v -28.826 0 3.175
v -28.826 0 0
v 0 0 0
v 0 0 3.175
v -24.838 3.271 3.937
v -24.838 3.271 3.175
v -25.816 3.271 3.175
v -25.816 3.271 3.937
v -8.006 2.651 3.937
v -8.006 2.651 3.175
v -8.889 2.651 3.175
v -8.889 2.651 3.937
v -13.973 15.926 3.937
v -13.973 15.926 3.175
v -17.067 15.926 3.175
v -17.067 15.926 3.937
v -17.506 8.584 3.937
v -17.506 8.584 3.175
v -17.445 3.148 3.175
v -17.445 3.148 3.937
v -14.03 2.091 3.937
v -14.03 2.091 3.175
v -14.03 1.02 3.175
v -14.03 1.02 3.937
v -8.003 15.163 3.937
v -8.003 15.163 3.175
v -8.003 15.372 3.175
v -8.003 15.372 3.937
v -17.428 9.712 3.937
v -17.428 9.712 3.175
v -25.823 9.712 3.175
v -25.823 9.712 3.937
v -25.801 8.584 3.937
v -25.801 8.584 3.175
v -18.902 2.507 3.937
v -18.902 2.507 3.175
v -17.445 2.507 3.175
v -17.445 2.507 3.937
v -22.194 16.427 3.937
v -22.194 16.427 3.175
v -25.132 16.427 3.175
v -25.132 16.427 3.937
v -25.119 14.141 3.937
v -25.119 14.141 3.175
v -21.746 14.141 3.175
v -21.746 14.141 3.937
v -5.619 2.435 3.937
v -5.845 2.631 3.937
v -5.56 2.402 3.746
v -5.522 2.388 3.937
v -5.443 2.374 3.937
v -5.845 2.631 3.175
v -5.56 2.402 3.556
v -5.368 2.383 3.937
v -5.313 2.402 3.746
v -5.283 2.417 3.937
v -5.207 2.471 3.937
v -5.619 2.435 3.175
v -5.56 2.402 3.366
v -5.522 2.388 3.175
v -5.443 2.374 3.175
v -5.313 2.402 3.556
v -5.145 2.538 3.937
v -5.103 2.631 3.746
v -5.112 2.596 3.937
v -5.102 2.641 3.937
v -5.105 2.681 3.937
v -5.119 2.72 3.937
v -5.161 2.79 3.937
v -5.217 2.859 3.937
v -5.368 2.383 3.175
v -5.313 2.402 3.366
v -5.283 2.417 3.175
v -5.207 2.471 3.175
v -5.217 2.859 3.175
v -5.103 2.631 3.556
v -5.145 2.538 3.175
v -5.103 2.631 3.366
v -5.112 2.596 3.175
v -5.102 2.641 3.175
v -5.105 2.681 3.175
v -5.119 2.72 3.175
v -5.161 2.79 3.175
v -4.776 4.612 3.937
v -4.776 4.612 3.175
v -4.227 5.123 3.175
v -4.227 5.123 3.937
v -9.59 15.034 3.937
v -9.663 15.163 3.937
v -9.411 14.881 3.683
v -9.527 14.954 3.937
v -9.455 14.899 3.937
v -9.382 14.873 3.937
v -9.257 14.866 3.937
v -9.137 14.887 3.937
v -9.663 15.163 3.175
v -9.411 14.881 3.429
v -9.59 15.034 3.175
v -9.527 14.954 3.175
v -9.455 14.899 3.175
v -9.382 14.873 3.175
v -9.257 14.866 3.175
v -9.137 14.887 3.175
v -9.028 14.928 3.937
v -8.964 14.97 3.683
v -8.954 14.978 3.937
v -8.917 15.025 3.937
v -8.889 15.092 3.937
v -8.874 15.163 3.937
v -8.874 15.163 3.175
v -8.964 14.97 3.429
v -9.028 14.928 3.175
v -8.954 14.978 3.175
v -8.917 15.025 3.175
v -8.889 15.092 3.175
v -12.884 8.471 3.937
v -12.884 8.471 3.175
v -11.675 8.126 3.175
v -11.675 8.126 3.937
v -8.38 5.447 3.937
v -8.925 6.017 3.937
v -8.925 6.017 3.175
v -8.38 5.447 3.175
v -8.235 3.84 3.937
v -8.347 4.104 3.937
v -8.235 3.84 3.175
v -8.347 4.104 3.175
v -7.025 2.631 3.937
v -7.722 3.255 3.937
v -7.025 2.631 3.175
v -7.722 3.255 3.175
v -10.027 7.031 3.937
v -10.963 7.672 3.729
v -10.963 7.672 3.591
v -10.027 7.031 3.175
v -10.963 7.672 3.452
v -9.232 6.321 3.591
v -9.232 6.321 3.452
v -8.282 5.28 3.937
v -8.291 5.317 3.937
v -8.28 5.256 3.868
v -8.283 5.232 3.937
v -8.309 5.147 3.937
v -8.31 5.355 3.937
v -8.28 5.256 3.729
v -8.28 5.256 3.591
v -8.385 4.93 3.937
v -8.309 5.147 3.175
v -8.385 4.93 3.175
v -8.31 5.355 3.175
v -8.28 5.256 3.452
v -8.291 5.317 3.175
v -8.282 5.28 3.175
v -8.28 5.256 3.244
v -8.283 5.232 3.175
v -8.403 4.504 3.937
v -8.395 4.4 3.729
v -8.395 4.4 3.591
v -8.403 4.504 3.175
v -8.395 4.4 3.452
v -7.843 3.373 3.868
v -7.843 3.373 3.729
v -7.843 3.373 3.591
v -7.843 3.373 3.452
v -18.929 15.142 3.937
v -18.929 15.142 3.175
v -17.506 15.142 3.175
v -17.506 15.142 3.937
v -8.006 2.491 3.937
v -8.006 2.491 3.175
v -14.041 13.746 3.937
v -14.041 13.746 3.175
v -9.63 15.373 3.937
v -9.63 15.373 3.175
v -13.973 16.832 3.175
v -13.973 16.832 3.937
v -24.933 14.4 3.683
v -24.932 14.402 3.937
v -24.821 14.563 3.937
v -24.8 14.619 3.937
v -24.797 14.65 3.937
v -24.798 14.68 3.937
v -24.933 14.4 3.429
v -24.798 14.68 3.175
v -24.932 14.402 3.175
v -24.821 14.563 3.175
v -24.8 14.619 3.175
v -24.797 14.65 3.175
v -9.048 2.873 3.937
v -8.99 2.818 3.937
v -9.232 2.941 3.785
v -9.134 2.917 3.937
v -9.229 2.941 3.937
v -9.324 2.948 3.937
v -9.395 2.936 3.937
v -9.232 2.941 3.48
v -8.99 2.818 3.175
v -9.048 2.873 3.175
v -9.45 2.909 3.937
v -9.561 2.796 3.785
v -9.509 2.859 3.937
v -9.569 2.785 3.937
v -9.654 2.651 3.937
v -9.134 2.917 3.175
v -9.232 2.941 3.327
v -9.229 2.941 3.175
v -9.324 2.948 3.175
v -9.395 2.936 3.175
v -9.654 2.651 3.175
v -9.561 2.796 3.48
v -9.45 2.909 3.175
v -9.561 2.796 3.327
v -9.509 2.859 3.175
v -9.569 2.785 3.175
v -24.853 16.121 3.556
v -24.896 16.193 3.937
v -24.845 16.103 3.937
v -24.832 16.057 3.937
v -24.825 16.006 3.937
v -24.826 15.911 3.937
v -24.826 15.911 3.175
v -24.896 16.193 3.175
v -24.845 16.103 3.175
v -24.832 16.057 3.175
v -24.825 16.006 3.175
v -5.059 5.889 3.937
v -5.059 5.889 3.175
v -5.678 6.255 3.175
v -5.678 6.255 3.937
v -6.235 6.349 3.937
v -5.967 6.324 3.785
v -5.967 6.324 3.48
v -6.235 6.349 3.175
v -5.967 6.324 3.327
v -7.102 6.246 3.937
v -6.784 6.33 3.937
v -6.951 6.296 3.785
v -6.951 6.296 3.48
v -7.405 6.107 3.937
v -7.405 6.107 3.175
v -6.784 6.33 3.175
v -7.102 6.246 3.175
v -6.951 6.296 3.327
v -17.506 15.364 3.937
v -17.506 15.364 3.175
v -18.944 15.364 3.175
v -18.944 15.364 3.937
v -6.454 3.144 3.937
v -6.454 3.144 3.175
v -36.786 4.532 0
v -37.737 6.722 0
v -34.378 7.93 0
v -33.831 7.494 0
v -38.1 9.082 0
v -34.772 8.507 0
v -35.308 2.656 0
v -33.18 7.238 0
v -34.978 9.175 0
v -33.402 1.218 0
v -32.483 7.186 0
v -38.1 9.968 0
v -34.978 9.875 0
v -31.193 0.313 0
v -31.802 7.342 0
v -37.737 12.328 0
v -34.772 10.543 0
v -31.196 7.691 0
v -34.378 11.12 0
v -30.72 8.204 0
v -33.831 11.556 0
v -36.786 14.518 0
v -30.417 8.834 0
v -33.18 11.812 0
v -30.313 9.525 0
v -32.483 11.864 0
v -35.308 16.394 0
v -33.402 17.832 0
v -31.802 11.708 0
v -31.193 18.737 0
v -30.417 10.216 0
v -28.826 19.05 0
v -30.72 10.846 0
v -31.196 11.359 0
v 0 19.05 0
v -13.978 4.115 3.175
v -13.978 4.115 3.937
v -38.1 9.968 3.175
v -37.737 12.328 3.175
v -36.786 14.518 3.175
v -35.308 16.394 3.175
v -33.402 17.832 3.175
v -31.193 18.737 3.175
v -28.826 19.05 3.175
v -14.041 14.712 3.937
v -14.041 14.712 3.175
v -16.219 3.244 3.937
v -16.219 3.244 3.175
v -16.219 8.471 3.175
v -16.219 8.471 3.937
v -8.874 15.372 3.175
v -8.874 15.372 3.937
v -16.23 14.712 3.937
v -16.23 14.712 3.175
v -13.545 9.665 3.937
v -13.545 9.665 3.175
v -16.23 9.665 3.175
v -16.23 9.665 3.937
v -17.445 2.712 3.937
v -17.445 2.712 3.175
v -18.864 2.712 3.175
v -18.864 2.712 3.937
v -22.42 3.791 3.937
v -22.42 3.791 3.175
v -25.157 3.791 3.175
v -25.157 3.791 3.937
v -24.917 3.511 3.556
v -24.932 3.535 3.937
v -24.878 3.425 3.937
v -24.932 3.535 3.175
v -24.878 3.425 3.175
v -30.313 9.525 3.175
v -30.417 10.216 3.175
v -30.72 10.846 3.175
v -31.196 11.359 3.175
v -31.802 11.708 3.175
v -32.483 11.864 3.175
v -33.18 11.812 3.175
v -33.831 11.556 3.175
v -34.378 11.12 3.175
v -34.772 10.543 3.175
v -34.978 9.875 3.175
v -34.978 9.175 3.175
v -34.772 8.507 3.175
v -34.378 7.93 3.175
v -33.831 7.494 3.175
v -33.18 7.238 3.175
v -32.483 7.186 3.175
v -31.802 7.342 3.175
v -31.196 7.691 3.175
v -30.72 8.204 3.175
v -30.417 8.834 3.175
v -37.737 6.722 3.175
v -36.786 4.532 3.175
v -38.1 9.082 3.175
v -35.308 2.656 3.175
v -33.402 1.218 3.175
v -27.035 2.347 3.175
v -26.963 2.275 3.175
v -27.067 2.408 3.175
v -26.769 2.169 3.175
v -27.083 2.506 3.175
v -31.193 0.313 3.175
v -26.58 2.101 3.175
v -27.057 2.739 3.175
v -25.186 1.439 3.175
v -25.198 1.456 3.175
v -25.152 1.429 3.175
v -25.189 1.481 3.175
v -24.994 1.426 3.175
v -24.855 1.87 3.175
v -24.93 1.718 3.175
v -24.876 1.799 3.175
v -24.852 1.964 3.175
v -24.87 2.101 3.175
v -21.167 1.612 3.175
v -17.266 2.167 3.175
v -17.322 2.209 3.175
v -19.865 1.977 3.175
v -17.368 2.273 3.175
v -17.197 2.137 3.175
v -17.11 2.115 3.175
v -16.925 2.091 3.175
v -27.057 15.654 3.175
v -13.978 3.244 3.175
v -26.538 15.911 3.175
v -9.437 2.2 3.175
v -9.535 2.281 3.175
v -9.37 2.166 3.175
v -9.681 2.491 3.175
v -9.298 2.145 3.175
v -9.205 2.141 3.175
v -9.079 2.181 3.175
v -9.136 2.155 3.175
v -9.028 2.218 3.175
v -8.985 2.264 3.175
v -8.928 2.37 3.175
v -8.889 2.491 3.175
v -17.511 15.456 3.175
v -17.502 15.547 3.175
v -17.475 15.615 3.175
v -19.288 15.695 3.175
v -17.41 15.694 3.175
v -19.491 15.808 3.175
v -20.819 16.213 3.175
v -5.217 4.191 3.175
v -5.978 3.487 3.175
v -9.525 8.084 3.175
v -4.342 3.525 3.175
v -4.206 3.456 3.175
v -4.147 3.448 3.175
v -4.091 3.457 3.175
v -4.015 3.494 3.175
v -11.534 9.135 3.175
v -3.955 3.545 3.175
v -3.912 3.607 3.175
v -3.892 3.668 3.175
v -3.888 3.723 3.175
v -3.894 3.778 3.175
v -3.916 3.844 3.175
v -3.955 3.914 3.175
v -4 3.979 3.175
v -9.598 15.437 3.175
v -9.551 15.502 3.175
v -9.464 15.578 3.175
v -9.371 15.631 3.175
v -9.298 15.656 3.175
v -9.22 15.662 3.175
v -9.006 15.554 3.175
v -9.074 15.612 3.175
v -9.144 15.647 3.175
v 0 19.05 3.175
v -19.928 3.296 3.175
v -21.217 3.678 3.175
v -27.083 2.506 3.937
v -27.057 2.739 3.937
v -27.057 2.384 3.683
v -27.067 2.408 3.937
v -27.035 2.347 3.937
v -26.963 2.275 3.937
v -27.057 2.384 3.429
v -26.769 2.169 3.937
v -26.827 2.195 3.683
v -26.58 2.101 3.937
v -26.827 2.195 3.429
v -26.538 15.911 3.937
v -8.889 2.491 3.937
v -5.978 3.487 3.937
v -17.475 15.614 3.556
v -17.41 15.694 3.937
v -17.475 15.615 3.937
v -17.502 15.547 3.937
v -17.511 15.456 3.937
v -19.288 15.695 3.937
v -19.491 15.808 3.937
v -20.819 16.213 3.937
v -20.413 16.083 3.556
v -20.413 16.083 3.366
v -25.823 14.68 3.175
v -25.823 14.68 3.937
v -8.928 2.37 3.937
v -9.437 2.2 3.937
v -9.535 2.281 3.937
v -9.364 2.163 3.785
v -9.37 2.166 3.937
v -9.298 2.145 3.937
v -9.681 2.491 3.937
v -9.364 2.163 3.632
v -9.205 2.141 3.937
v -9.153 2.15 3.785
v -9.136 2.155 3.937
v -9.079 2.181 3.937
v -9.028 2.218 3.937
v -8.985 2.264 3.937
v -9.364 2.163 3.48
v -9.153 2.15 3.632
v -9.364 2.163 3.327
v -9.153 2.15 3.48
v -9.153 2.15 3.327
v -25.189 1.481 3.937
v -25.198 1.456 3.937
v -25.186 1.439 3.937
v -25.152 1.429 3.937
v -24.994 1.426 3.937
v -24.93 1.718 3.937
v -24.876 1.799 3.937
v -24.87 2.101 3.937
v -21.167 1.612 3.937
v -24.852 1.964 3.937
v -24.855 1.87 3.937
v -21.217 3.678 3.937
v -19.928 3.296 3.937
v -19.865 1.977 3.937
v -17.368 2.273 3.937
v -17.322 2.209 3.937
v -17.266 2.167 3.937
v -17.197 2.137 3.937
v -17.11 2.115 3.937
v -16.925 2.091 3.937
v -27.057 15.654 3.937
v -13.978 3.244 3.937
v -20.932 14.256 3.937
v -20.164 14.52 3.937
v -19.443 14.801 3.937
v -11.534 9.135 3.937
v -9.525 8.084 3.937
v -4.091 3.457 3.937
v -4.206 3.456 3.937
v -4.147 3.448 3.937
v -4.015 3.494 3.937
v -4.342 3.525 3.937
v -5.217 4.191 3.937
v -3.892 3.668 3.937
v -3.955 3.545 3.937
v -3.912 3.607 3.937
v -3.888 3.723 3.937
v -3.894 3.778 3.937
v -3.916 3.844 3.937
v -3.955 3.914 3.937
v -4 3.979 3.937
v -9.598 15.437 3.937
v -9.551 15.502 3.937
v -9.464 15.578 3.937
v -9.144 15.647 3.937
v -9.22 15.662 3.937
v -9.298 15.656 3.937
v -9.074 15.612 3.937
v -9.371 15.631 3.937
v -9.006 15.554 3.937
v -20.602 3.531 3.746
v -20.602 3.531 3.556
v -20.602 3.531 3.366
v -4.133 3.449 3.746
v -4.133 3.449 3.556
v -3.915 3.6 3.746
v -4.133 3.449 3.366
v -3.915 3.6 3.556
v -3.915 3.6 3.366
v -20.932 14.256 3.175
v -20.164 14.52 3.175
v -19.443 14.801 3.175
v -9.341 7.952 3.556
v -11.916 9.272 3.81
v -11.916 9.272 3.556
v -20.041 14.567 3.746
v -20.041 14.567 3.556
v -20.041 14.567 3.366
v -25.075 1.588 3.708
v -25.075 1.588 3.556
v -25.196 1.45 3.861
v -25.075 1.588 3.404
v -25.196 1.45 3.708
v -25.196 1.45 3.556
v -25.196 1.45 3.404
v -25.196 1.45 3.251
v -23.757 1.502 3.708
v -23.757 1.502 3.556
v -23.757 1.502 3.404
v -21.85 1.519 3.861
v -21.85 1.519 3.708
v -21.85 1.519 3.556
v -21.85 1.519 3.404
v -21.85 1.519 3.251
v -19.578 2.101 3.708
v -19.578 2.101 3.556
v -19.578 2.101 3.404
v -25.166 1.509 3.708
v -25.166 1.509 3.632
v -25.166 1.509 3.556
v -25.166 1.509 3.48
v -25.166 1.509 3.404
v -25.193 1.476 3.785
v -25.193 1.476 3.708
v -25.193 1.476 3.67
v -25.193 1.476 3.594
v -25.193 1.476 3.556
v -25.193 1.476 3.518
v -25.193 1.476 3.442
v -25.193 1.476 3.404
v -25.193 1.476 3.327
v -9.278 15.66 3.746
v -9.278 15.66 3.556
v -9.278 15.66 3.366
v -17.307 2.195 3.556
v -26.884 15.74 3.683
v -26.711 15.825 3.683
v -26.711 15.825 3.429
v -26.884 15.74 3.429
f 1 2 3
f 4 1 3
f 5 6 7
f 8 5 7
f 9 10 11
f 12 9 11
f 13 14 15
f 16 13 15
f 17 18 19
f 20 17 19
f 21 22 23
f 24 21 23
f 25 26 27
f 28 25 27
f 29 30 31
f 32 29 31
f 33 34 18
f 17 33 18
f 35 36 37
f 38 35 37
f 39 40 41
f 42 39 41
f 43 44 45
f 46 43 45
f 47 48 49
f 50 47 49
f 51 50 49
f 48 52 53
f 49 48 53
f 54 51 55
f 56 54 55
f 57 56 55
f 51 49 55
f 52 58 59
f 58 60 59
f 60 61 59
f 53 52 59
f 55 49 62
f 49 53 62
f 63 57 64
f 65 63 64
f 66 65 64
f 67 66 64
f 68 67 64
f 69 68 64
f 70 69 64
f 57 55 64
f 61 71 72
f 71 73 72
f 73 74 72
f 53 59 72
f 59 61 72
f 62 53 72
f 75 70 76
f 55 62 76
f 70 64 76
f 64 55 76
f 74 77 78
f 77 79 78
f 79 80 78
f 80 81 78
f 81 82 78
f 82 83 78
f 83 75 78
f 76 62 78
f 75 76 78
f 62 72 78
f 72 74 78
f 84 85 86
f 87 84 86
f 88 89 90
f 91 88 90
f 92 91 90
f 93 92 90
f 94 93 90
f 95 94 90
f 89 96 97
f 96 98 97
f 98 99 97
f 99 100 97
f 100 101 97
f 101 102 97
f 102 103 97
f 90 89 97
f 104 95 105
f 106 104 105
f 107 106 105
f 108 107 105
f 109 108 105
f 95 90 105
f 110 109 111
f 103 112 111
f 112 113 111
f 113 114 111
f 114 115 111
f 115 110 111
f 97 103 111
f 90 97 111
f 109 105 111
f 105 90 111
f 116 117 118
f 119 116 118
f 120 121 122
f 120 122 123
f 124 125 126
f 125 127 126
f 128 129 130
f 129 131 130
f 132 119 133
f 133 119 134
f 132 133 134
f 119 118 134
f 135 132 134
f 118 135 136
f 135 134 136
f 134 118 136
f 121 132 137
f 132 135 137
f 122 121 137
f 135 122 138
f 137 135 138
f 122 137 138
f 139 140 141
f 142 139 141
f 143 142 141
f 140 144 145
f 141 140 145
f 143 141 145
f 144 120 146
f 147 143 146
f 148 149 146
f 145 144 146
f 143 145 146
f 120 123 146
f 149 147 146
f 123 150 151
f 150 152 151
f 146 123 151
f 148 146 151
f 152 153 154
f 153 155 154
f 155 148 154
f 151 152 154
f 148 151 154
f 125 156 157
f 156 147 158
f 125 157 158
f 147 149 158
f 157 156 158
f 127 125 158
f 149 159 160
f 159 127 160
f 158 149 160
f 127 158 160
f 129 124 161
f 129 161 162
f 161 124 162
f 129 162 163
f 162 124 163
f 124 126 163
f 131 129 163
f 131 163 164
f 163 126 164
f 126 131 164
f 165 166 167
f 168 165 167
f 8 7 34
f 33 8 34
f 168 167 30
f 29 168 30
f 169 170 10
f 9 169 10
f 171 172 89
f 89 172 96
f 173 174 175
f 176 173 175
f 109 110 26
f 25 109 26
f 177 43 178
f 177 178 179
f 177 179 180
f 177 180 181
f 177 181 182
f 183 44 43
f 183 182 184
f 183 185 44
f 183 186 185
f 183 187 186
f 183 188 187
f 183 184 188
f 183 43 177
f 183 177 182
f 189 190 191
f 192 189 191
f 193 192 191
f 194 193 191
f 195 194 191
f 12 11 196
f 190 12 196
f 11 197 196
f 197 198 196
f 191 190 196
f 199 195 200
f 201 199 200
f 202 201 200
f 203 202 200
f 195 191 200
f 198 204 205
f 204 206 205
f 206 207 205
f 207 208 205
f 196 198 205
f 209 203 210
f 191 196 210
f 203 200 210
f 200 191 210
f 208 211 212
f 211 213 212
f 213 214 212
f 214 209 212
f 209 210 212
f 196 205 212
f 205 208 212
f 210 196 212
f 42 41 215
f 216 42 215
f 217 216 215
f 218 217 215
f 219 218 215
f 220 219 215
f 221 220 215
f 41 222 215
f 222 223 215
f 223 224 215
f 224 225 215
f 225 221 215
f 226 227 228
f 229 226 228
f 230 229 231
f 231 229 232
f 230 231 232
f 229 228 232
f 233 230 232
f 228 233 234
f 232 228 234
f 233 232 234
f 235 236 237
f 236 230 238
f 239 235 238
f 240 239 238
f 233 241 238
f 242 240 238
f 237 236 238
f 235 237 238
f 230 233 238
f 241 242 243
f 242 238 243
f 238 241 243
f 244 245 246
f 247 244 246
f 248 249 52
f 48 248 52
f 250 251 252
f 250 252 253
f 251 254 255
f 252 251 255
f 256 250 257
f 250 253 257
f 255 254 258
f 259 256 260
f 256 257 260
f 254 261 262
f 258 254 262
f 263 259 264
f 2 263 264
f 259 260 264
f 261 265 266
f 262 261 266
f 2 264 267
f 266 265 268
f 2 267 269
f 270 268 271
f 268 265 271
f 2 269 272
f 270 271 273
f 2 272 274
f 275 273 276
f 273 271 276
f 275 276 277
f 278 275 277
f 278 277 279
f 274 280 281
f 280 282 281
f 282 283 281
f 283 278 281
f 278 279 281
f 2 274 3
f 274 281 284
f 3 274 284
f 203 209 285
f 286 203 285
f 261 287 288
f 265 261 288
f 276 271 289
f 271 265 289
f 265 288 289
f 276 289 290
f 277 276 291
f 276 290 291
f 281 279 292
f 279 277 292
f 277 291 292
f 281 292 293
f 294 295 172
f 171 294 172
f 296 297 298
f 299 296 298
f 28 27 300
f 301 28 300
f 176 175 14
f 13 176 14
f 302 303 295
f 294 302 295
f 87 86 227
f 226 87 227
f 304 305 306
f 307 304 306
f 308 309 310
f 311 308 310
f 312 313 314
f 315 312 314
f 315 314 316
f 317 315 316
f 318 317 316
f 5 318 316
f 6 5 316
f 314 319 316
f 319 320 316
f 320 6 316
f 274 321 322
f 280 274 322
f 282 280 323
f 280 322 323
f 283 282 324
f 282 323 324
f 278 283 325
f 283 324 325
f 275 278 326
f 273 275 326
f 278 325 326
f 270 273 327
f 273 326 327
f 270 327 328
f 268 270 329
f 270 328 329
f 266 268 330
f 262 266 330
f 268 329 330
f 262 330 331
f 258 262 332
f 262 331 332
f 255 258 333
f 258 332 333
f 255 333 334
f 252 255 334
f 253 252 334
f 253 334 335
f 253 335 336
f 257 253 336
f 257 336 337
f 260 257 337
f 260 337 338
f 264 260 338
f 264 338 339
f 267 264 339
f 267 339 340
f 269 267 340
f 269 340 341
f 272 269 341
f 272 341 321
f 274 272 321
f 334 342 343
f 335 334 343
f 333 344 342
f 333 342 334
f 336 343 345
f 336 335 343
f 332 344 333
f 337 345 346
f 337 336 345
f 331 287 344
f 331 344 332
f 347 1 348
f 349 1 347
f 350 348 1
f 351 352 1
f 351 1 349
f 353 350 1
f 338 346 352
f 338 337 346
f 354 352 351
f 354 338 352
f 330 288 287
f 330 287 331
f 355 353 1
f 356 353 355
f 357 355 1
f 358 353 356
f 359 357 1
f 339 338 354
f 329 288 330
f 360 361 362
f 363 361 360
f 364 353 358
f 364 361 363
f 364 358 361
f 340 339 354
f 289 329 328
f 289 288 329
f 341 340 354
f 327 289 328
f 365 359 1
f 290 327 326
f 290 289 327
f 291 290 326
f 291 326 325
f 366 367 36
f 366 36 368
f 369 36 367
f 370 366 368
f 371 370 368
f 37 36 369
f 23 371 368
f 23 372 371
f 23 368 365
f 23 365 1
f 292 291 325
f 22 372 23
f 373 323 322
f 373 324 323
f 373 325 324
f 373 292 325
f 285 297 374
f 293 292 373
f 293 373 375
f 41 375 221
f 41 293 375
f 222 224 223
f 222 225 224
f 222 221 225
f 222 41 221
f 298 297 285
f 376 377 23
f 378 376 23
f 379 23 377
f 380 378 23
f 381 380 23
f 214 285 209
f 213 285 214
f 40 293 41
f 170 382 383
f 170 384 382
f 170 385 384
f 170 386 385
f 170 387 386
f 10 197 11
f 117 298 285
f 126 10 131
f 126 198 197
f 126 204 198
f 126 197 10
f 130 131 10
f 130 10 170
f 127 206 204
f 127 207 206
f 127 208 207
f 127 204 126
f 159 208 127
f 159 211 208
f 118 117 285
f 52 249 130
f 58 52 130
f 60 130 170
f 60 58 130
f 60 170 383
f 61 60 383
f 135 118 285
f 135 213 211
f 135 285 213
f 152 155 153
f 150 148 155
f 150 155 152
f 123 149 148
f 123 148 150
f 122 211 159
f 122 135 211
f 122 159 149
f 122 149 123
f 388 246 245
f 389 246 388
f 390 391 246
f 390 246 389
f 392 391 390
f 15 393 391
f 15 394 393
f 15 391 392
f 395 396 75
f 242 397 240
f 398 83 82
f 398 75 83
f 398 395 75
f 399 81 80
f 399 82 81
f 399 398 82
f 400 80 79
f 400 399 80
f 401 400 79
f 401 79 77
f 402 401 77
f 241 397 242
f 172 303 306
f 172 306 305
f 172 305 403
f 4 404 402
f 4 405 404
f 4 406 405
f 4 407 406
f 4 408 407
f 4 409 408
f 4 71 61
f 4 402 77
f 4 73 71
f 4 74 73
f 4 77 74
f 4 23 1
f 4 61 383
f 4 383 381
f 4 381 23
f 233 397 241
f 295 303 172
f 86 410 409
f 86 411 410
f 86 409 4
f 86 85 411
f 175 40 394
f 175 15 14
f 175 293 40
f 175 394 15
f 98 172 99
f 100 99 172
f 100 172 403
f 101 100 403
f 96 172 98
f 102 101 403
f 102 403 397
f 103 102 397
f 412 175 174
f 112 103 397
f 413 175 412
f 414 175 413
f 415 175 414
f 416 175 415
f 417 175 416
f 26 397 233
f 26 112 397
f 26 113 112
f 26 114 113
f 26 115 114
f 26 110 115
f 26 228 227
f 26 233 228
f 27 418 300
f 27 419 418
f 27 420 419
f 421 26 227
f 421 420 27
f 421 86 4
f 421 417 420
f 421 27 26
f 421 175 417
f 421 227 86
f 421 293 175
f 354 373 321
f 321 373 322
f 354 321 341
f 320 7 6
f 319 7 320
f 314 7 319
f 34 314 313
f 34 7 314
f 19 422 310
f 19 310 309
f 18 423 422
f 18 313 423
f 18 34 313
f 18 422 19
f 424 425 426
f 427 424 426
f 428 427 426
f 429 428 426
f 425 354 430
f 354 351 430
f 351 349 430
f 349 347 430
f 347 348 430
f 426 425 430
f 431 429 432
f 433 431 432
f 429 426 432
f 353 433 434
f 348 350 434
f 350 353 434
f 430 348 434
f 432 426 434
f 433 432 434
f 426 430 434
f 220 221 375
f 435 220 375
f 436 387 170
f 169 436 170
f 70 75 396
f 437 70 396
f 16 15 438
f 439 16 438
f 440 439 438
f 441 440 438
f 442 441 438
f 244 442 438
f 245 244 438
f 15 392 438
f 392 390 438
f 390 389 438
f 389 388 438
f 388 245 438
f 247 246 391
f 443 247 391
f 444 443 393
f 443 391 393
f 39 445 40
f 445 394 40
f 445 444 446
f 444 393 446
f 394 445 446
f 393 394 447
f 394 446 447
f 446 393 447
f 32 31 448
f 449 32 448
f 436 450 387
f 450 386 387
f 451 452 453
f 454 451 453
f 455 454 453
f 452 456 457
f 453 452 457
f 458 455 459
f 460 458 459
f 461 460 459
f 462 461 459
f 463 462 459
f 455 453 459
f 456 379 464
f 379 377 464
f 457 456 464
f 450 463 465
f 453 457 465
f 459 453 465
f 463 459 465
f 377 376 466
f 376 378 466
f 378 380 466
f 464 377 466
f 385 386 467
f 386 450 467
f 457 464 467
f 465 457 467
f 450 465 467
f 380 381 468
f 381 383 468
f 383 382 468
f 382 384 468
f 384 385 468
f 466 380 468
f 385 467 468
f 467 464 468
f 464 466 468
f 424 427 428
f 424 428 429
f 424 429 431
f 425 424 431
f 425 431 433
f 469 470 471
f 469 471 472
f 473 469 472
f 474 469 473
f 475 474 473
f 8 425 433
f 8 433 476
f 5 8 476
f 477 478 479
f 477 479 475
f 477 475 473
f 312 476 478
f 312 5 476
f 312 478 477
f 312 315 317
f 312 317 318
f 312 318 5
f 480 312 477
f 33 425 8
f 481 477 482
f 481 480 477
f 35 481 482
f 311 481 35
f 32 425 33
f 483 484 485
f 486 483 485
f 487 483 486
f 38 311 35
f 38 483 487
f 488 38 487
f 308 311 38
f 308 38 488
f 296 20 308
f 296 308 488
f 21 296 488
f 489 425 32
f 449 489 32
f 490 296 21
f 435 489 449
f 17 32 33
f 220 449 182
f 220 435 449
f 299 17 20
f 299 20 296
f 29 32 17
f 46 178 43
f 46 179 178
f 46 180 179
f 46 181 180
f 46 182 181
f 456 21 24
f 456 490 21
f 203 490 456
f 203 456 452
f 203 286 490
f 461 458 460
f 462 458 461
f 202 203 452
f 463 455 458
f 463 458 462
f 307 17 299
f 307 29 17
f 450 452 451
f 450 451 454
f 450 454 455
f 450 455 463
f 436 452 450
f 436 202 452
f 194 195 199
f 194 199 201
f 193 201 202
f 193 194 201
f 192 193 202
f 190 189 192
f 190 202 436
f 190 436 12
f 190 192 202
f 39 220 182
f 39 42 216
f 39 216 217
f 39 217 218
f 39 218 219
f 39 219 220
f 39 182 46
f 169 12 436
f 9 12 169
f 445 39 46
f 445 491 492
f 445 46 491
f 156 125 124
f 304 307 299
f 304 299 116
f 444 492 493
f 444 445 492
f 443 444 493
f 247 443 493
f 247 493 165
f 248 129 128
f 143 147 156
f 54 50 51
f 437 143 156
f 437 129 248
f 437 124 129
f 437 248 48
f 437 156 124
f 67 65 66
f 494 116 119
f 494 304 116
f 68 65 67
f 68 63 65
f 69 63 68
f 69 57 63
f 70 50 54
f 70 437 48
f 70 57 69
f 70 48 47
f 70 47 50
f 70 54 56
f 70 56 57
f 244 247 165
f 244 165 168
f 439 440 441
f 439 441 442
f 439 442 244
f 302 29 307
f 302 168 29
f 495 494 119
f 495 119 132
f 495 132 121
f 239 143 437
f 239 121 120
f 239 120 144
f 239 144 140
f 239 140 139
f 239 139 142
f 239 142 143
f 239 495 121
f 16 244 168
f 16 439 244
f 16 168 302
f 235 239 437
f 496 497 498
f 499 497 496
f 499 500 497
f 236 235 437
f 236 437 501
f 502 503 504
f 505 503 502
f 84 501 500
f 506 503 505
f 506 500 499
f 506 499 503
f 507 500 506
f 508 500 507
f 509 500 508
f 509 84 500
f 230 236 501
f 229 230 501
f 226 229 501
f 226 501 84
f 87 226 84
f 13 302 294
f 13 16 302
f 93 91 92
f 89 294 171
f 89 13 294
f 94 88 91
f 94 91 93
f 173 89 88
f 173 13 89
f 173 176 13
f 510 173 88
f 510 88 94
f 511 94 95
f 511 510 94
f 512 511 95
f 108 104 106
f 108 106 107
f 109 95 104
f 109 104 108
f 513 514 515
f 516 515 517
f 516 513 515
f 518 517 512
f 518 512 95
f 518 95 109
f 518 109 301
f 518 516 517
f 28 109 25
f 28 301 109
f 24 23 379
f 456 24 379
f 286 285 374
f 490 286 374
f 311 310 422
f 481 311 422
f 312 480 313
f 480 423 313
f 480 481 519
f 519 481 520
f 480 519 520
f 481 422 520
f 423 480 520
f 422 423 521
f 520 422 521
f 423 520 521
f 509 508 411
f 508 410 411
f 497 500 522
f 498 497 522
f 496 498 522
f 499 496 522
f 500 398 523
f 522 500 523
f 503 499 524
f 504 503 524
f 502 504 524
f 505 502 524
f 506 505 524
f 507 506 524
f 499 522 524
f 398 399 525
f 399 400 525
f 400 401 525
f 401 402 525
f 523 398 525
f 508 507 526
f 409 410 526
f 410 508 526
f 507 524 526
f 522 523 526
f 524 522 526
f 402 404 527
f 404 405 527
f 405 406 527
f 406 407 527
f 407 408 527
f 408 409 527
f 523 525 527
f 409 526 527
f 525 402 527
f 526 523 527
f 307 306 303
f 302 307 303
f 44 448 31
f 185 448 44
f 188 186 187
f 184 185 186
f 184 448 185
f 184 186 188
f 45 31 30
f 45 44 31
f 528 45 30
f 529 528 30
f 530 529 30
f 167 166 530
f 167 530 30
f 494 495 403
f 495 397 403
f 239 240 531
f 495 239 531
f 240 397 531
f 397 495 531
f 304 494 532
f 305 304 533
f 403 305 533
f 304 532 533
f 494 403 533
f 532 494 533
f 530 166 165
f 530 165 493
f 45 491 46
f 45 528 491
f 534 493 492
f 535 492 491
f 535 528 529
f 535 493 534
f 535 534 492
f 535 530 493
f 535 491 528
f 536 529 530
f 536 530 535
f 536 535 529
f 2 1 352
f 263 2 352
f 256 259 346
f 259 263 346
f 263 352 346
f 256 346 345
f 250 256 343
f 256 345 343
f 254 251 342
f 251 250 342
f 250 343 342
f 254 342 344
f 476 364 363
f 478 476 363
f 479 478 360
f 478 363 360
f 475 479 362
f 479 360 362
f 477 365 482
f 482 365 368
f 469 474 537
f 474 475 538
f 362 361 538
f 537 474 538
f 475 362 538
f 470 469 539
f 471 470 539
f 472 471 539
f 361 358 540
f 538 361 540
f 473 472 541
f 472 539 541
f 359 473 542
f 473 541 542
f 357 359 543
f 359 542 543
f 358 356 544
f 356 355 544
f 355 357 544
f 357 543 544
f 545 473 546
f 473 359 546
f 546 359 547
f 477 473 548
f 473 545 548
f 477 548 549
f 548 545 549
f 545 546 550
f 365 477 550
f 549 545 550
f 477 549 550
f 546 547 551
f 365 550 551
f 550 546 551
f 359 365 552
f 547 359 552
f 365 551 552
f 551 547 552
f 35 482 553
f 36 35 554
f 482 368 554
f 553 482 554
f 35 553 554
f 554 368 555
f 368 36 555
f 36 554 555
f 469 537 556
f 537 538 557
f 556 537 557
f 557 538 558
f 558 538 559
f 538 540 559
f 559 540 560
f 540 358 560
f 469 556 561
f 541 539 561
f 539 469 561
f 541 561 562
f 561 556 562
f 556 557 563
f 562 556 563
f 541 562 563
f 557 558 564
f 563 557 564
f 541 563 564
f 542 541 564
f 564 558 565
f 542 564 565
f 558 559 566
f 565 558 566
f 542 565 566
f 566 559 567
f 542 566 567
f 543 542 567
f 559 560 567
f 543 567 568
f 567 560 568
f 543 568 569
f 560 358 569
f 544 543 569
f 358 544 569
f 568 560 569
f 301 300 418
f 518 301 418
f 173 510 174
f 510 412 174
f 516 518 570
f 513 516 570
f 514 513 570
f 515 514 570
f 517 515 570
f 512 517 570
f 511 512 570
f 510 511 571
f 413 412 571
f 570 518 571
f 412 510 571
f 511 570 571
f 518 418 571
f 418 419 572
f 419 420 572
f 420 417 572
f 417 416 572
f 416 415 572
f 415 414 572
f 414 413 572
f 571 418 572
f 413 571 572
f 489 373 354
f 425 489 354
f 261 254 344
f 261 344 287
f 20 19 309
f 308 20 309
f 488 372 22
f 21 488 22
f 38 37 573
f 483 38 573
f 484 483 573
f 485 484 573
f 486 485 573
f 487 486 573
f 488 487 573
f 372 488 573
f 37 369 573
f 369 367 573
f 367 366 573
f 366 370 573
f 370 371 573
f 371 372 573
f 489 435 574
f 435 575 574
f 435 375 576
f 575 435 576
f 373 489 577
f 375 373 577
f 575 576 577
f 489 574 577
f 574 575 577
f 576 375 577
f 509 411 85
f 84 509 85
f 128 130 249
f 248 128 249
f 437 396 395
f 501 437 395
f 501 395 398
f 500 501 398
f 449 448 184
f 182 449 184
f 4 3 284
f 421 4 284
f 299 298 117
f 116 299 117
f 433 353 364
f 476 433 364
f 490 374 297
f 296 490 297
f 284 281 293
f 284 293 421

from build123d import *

# Parameters (mm, degrees)
F0_W     = 38.1
F0_H     = 19.05
F1_DEPTH = 3.175
F2_R     = 2.3454703993
F3_DEPTH = 3.176
F5_DEPTH = 0.762


with BuildPart() as f1:
    # F0 (on Top) → F1 (new body)
    with BuildSketch(Plane.XY):
        with Locations((-19.05, 9.525)):
            Rectangle(F0_W, F0_H)
    extrude(amount=F1_DEPTH)

    # F2 (on face) → F3 (cut, through all)
    with BuildSketch(Plane.XY.offset(3.175)):
        with Locations((-32.6583981514, 9.525)):
            Circle(F2_R)
        with BuildLine():
            ThreePointArc((-38.1, 9.9683756083), (-35.308362686, 16.3938160997), (-28.8257542998, 19.05))
            Line((-28.8257542998, 19.05), (-38.1, 19.05))
            Line((-38.1, 19.05), (-38.1, 9.9683756083))
        make_face()
        with BuildLine():
            ThreePointArc((-28.8257542998, 0), (-35.308362686, 2.6561839003), (-38.1, 9.0816243917))
            Line((-38.1, 9.0816243917), (-38.1, 0))
            Line((-38.1, 0), (-28.8257542998, 0))
        make_face()
    extrude(amount=-F3_DEPTH, mode=Mode.SUBTRACT)

    # F4 (on face) → F5 (join)
    with BuildSketch(Plane.XY.offset(3.175)):
        with BuildLine():
            add(Edge.make_bspline(
                [(-26.5377387404, 15.9110687673), (-26.7108747115, 15.8254740139), (-26.8840106825, 15.7398792605), (-27.0571466535, 15.654284507)],
                knots=[0, 0, 0, 0, 0.579415858, 0.579415858, 0.579415858, 0.579415858], degree=3))
            Line((-27.0571466535, 15.654284507), (-27.0571466535, 2.7385666035))
            add(Edge.make_bspline(
                [(-27.0571466535, 2.7385666035), (-27.0795693358, 2.6088543631), (-27.1225207817, 2.3603859501), (-26.8266557283, 2.183014384), (-26.6604257883, 2.1276841688), (-26.579702273, 2.1008150652)],
                knots=[0, 0, 0, 0, 0.359730405, 0.6890763936, 1, 1, 1, 1], degree=3))
            Line((-26.579702273, 2.1008150652), (-24.8697847128, 2.1008150652))
            add(Edge.make_bspline(
                [(-24.8697847128, 2.1008150652), (-24.8535585114, 1.9993606342), (-24.820613422, 1.7933712454), (-25.0545304604, 1.6052521128), (-25.323348361, 1.3860952125), (-24.5846096398, 1.4667534331), (-23.7811649583, 1.5054977354), (-22.5648546478, 1.5317740605), (-21.8525212711, 1.4849440744), (-20.7065855211, 1.6821403738), (-19.5728440966, 2.0528020227), (-19.1090591627, 2.3669456633), (-18.9018342644, 2.5073089637)],
                knots=[0, 0, 0, 0, 0.0654142898, 0.1328147962, 0.1852280569, 0.2717986293, 0.3900220534, 0.5225934237, 0.6267763583, 0.7573014589, 0.891559262, 1, 1, 1, 1], degree=3))
            Line((-18.9018342644, 2.5073089637), (-17.4452550709, 2.5073089637))
            add(Edge.make_bspline(
                [(-17.4452550709, 2.5073089637), (-17.416342407, 2.3859721487), (-17.3563210578, 2.1340825495), (-17.0722687387, 2.1058012821), (-16.9250462204, 2.0911432803)],
                knots=[0, 0, 0, 0, 0.4817063324, 1, 1, 1, 1], degree=3))
            Line((-16.9250462204, 2.0911432803), (-14.0298530459, 2.0911432803))
            Line((-14.0298530459, 2.0911432803), (-14.0298530459, 1.0200680699))
            Line((-14.0298530459, 1.0200680699), (-9.6812043339, 2.4914150126))
            add(Edge.make_bspline(
                [(-9.6812043339, 2.4914150126), (-9.6409541279, 2.4226709942), (-9.5613256349, 2.2866721227), (-9.3732923035, 2.143877022), (-9.146753539, 2.1258439034), (-8.9577295904, 2.2565656827), (-8.9125275808, 2.4112662698), (-8.8891088963, 2.4914150126)],
                knots=[0, 0, 0, 0, 0.2053847319, 0.4063203233, 0.6002825129, 0.7929105851, 1, 1, 1, 1], degree=3))
            Line((-8.8891088963, 2.4914150126), (-8.0058202147, 2.4914150126))
            Line((-8.0058202147, 2.4914150126), (-8.0058202147, 2.6511875913))
            Line((-8.0058202147, 2.6511875913), (-8.8891088963, 2.6511875913))
            add(Edge.make_bspline(
                [(-8.8891088963, 2.6511875913), (-8.9310142556, 2.7313268058), (-9.0111442626, 2.8845662941), (-9.2288589733, 2.9502078721), (-9.4263111029, 2.954461386), (-9.5681762791, 2.7983408667), (-9.6258537843, 2.6991547711), (-9.6537470818, 2.6511875913)],
                knots=[0, 0, 0, 0, 0.2243735688, 0.4290395288, 0.619806208, 0.816135277, 1, 1, 1, 1], degree=3))
            Line((-9.6537470818, 2.6511875913), (-13.9779066667, 4.1145463474))
            Line((-13.9779066667, 4.1145463474), (-13.9779066667, 3.2444412354))
            Line((-13.9779066667, 3.2444412354), (-16.2190869451, 3.2444412354))
            Line((-16.2190869451, 3.2444412354), (-16.2190869451, 8.471253328))
            Line((-16.2190869451, 8.471253328), (-12.8844231367, 8.471253328))
            add(Edge.make_bspline(
                [(-12.8844231367, 8.471253328), (-12.4868405129, 8.3912644099), (-11.73186638, 8.2393725502), (-10.9755685718, 7.6600087014), (-10.0278228964, 7.0776029449), (-9.2641156682, 6.3657609783), (-8.4323489729, 5.5191632424), (-8.2256469446, 5.2628506515), (-8.4263613819, 4.9657352945), (-8.4045845677, 4.387056325), (-8.3245215623, 3.8946895211), (-7.8349969225, 3.3357865397), (-7.3142777062, 2.8825893477), (-7.0247473195, 2.6306025684)],
                knots=[0, 0, 0, 0, 0.1119269029, 0.2125392595, 0.3204849305, 0.4302536688, 0.542538281, 0.5958954746, 0.6528186178, 0.7312491143, 0.8038353409, 0.8909284931, 1, 1, 1, 1], degree=3))
            Line((-7.0247473195, 2.6306025684), (-6.4539997838, 3.1442753971))
            Line((-6.4539997838, 3.1442753971), (-5.8452025987, 2.6306025684))
            add(Edge.make_bspline(
                [(-5.8452025987, 2.6306025684), (-5.7510163843, 2.5382953385), (-5.5793479133, 2.3700515982), (-5.3068982698, 2.3599422662), (-5.0234062685, 2.629445519), (-5.1548387797, 2.7849198566), (-5.217380356, 2.8589016292)],
                knots=[0, 0, 0, 0, 0.2794125753, 0.5092712331, 0.7664888973, 1, 1, 1, 1], degree=3))
            Line((-5.217380356, 2.8589016292), (-5.9783770703, 3.4867241047))
            Line((-5.9783770703, 3.4867241047), (-5.217380356, 4.190646112))
            Line((-5.217380356, 4.190646112), (-4.3422332965, 3.5247737542))
            add(Edge.make_bspline(
                [(-4.3422332965, 3.5247737542), (-4.2753552319, 3.4833438946), (-4.1355489457, 3.396736203), (-3.8719087651, 3.5821675688), (-3.8873582518, 3.8259382225), (-3.9635831277, 3.9291369105), (-4.0002227761, 3.9787422866)],
                knots=[0, 0, 0, 0, 0.2503847052, 0.5234205857, 0.7709185888, 1, 1, 1, 1], degree=3))
            Line((-4.0002227761, 3.9787422866), (-4.7757523134, 4.6124062501))
            Line((-4.7757523134, 4.6124062501), (-4.2272070423, 5.1231207326))
            Line((-4.2272070423, 5.1231207326), (-5.0594825298, 5.8891922235))
            add(Edge.make_bspline(
                [(-5.0594825298, 5.8891922235), (-5.2342245953, 6.0119831219), (-5.5535406301, 6.2363658579), (-5.9633037959, 6.3380845337), (-6.4624834448, 6.3629289512), (-6.9588518276, 6.326635918), (-7.2564382113, 6.1799434156), (-7.404985372, 6.1067184433)],
                knots=[0, 0, 0, 0, 0.2203014043, 0.4025691847, 0.6016033984, 0.8011310759, 1, 1, 1, 1], degree=3))
            add(Edge.make_bspline(
                [(-7.404985372, 6.1067184433), (-7.8012870357, 6.5100044394), (-8.5207565636, 7.2421975688), (-9.3143752369, 7.9809513855), (-10.4526059497, 8.667475744), (-11.8318533209, 9.304087771), (-13.1655398172, 9.6100287611), (-13.4780210852, 9.655550231), (-13.5454072432, 9.665475678)],
                knots=[0, 0, 0, 0, 0.1949094928, 0.3542547898, 0.528809926, 0.7243716486, 0.9083314981, 0.9676026394, 0.9676026394, 0.9676026394, 0.9676026394], degree=3))
            Line((-13.5454072432, 9.665475678), (-13.5536914822, 9.665475678))
            Line((-13.5536914822, 9.665475678), (-16.2297561765, 9.665475678))
            Line((-16.2297561765, 9.665475678), (-16.2297561765, 14.7121604532))
            Line((-16.2297561765, 14.7121604532), (-14.0407746658, 14.7121604532))
            Line((-14.0407746658, 14.7121604532), (-14.0407746658, 13.74643296))
            Line((-14.0407746658, 13.74643296), (-9.6628116444, 15.162833035))
            add(Edge.make_bspline(
                [(-9.6628116444, 15.162833035), (-9.5994792917, 15.0419453644), (-9.4666485777, 14.7884096682), (-8.9151551249, 14.924804863), (-8.8862007543, 15.0941198994), (-8.8744670414, 15.162833035)],
                knots=[0, 0, 0, 0, 0.3512906634, 0.7367442472, 1, 1, 1, 1], degree=3))
            Line((-8.8744670414, 15.162833035), (-8.0032702535, 15.162833035))
            Line((-8.0032702535, 15.162833035), (-8.0032702535, 15.3721110607))
            Line((-8.0032702535, 15.3721110607), (-8.8744670414, 15.3721110607))
            add(Edge.make_bspline(
                [(-8.8744670414, 15.3721110607), (-8.9258811293, 15.4535897314), (-9.0257330431, 15.6112970859), (-9.2823856435, 15.7082360182), (-9.5546444314, 15.5282819888), (-9.6134472425, 15.4120218853), (-9.6300745245, 15.3725532584)],
                knots=[0, 0, 0, 0, 0.2589067963, 0.4997338796, 0.7803818448, 0.9274568815, 0.9274568815, 0.9274568815, 0.9274568815], degree=3))
            Line((-9.6300745245, 15.3725532584), (-13.9726913457, 16.8323148205))
            Line((-13.9726913457, 16.8323148205), (-13.9726913457, 15.9259032621))
            Line((-13.9726913457, 15.9259032621), (-17.0669947674, 15.9259032621))
            add(Edge.make_bspline(
                [(-17.0669947674, 15.9259032621), (-17.2379265625, 15.8260077216), (-17.5305453526, 15.6574083814), (-17.5131075408, 15.4495405967), (-17.506107688, 15.3641048819)],
                knots=[0, 0, 0, 0, 0.5880208056, 1, 1, 1, 1], degree=3))
            Line((-17.506107688, 15.3641048819), (-18.9438629895, 15.3641048819))
            add(Edge.make_bspline(
                [(-18.9438629895, 15.3641048819), (-19.0730076064, 15.5122124042), (-19.3699914184, 15.8528037322), (-20.4455895706, 16.0592715534), (-21.1153456714, 16.3460981975), (-21.8142141514, 16.3983614206), (-22.1944451332, 16.4267960936)],
                knots=[0, 0, 0, 0, 0.212159, 0.4878855201, 0.7213756277, 1, 1, 1, 1], degree=3))
            Line((-22.1944451332, 16.4267960936), (-25.1324698329, 16.4267960936))
            add(Edge.make_bspline(
                [(-25.1324698329, 16.4267960936), (-25.0155507598, 16.3238609839), (-24.815014757, 16.1473098455), (-24.822982641, 15.9805868028), (-24.8263049871, 15.9110687673)],
                knots=[0, 0, 0, 0, 0.583032829, 1, 1, 1, 1], degree=3))
            Line((-24.8263049871, 15.9110687673), (-26.5377387404, 15.9110687673))
        make_face()
        with BuildLine():
            Line((-25.8164200932, 3.2712235115), (-25.8011277765, 8.5837785155))
            Line((-25.8011277765, 8.5837785155), (-17.506107688, 8.5837785155))
            Line((-17.506107688, 8.5837785155), (-17.4452550709, 3.1483727507))
            Line((-17.4452550709, 3.1483727507), (-17.4452550709, 2.7118595317))
            Line((-17.4452550709, 2.7118595317), (-18.8643243164, 2.7118595317))
            add(Edge.make_bspline(
                [(-18.8643243164, 2.7118595317), (-19.0815269134, 2.85521998), (-19.5524918726, 3.166071455), (-20.5984014649, 3.5593135264), (-21.5481955341, 3.753304769), (-22.1358927762, 3.7784602355), (-22.4202815443, 3.7906330545)],
                knots=[0, 0, 0, 0, 0.2329927864, 0.5052031588, 0.7605660635, 1, 1, 1, 1], degree=3))
            Line((-22.4202815443, 3.7906330545), (-25.1571703702, 3.7906330545))
            add(Edge.make_bspline(
                [(-25.1571703702, 3.7906330545), (-25.0642022591, 3.6982952356), (-24.8942335308, 3.5294788374), (-24.855211218, 3.3517428953), (-24.837533012, 3.2712235115)],
                knots=[0, 0, 0, 0, 0.5469718577, 1, 1, 1, 1], degree=3))
            Line((-24.837533012, 3.2712235115), (-25.8164200932, 3.2712235115))
        make_face(mode=Mode.SUBTRACT)
        with BuildLine():
            Line((-18.9293026924, 15.1415970176), (-17.506107688, 15.1415970176))
            Line((-17.506107688, 15.1415970176), (-17.428284511, 9.7119892016))
            Line((-17.428284511, 9.7119892016), (-25.822866708, 9.7119892016))
            Line((-25.822866708, 9.7119892016), (-25.822866708, 14.6800291177))
            Line((-25.822866708, 14.6800291177), (-24.7983376545, 14.6800291177))
            add(Edge.make_bspline(
                [(-25.1186843961, 14.1409179196), (-25.0576893253, 14.2285084067), (-24.9435954911, 14.3923500806), (-24.7955780658, 14.5766326071), (-24.7956461395, 14.6560214032), (-24.7983376545, 14.6800291177)],
                knots=[0, 0, 0, 0, 0.4063243511, 0.7600467132, 0.9204385352, 0.9204385352, 0.9204385352, 0.9204385352], degree=3))
            Line((-25.1186843961, 14.1409179196), (-21.7460282147, 14.1409179196))
            add(Edge.make_bspline(
                [(-18.9293026924, 15.1415970176), (-19.0907602148, 15.0203952413), (-19.4210171313, 14.772480345), (-20.0535811337, 14.5777947582), (-20.8713014134, 14.222314871), (-21.4546989083, 14.168027318), (-21.7460282147, 14.1409179196)],
                knots=[0, 0, 0, 0, 0.2237759252, 0.4577274938, 0.7292071452, 1, 1, 1, 1], degree=3))
        make_face(mode=Mode.SUBTRACT)
    extrude(amount=F5_DEPTH)


solid = f1.part
